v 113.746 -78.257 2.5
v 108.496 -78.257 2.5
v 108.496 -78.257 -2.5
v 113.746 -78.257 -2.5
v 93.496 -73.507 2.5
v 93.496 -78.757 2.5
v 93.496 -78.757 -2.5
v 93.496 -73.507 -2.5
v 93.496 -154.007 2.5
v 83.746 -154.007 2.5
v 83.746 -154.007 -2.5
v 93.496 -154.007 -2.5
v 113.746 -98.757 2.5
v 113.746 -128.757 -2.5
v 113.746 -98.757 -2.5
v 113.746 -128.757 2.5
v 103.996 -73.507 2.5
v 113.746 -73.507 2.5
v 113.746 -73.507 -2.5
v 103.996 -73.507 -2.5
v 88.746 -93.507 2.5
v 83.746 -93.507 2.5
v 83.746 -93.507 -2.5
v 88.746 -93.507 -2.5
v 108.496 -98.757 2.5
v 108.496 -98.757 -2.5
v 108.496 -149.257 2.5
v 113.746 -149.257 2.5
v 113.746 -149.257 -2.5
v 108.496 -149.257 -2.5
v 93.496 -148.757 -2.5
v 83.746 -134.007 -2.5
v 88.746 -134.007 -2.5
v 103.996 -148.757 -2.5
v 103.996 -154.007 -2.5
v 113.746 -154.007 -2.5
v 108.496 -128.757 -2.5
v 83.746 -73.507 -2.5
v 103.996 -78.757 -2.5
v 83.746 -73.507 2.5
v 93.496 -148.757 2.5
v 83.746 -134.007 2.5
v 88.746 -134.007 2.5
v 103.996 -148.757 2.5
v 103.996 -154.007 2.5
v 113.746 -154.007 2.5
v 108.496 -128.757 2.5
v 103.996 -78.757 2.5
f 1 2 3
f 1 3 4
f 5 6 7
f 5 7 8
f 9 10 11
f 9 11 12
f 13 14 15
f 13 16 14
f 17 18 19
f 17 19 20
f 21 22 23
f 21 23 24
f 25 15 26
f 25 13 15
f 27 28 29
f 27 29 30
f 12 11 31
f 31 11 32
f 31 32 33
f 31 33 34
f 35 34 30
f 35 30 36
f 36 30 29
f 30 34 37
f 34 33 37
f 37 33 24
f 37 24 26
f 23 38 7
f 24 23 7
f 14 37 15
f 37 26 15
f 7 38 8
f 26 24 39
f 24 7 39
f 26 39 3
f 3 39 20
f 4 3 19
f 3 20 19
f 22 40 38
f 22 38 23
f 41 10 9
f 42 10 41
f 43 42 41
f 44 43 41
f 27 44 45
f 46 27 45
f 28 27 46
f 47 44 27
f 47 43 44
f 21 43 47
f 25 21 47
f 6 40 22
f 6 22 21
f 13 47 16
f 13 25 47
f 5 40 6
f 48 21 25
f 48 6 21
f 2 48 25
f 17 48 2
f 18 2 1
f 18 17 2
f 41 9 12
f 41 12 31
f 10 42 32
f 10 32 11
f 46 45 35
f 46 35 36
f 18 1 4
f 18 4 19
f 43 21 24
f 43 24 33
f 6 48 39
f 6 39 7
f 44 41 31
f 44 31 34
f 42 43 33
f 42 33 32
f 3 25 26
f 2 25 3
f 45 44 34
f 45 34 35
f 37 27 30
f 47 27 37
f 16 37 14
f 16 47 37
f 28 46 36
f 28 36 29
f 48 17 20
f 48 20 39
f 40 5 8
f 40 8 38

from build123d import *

# Parameters (mm, degrees)
BOSS_EXTRUDE1_DEPTH = 2.5


with BuildPart() as part:
    # Sketch2 → Boss-Extrude1 (new, symmetric)
    with BuildSketch(Plane.XY):
        Polygon((113.746163942, -98.757408203), (108.496163942, -98.757408203), (108.496163942, -78.257408203), (113.746163942, -78.257408203), (113.746163942, -73.507408203), (103.996163942, -73.507408203), (103.996163942, -78.757408203), (93.496163942, -78.757408203), (93.496163942, -73.507408203), (83.746163942, -73.507408203), (83.746163942, -93.507408203), (88.746163942, -93.507408203), (88.746163942, -134.007377288), (83.746163942, -134.007377288), (83.746163942, -154.007377288), (93.496163942, -154.007377288), (93.496163942, -148.757377288), (103.996163942, -148.757377288), (103.996163942, -154.007377288), (113.746163942, -154.007377288), (113.746163942, -149.257377288), (108.496163942, -149.257377288), (108.496163942, -128.757377288), (113.746163942, -128.757377288), align=None)
    extrude(amount=BOSS_EXTRUDE1_DEPTH, both=True)


solid = part.part
